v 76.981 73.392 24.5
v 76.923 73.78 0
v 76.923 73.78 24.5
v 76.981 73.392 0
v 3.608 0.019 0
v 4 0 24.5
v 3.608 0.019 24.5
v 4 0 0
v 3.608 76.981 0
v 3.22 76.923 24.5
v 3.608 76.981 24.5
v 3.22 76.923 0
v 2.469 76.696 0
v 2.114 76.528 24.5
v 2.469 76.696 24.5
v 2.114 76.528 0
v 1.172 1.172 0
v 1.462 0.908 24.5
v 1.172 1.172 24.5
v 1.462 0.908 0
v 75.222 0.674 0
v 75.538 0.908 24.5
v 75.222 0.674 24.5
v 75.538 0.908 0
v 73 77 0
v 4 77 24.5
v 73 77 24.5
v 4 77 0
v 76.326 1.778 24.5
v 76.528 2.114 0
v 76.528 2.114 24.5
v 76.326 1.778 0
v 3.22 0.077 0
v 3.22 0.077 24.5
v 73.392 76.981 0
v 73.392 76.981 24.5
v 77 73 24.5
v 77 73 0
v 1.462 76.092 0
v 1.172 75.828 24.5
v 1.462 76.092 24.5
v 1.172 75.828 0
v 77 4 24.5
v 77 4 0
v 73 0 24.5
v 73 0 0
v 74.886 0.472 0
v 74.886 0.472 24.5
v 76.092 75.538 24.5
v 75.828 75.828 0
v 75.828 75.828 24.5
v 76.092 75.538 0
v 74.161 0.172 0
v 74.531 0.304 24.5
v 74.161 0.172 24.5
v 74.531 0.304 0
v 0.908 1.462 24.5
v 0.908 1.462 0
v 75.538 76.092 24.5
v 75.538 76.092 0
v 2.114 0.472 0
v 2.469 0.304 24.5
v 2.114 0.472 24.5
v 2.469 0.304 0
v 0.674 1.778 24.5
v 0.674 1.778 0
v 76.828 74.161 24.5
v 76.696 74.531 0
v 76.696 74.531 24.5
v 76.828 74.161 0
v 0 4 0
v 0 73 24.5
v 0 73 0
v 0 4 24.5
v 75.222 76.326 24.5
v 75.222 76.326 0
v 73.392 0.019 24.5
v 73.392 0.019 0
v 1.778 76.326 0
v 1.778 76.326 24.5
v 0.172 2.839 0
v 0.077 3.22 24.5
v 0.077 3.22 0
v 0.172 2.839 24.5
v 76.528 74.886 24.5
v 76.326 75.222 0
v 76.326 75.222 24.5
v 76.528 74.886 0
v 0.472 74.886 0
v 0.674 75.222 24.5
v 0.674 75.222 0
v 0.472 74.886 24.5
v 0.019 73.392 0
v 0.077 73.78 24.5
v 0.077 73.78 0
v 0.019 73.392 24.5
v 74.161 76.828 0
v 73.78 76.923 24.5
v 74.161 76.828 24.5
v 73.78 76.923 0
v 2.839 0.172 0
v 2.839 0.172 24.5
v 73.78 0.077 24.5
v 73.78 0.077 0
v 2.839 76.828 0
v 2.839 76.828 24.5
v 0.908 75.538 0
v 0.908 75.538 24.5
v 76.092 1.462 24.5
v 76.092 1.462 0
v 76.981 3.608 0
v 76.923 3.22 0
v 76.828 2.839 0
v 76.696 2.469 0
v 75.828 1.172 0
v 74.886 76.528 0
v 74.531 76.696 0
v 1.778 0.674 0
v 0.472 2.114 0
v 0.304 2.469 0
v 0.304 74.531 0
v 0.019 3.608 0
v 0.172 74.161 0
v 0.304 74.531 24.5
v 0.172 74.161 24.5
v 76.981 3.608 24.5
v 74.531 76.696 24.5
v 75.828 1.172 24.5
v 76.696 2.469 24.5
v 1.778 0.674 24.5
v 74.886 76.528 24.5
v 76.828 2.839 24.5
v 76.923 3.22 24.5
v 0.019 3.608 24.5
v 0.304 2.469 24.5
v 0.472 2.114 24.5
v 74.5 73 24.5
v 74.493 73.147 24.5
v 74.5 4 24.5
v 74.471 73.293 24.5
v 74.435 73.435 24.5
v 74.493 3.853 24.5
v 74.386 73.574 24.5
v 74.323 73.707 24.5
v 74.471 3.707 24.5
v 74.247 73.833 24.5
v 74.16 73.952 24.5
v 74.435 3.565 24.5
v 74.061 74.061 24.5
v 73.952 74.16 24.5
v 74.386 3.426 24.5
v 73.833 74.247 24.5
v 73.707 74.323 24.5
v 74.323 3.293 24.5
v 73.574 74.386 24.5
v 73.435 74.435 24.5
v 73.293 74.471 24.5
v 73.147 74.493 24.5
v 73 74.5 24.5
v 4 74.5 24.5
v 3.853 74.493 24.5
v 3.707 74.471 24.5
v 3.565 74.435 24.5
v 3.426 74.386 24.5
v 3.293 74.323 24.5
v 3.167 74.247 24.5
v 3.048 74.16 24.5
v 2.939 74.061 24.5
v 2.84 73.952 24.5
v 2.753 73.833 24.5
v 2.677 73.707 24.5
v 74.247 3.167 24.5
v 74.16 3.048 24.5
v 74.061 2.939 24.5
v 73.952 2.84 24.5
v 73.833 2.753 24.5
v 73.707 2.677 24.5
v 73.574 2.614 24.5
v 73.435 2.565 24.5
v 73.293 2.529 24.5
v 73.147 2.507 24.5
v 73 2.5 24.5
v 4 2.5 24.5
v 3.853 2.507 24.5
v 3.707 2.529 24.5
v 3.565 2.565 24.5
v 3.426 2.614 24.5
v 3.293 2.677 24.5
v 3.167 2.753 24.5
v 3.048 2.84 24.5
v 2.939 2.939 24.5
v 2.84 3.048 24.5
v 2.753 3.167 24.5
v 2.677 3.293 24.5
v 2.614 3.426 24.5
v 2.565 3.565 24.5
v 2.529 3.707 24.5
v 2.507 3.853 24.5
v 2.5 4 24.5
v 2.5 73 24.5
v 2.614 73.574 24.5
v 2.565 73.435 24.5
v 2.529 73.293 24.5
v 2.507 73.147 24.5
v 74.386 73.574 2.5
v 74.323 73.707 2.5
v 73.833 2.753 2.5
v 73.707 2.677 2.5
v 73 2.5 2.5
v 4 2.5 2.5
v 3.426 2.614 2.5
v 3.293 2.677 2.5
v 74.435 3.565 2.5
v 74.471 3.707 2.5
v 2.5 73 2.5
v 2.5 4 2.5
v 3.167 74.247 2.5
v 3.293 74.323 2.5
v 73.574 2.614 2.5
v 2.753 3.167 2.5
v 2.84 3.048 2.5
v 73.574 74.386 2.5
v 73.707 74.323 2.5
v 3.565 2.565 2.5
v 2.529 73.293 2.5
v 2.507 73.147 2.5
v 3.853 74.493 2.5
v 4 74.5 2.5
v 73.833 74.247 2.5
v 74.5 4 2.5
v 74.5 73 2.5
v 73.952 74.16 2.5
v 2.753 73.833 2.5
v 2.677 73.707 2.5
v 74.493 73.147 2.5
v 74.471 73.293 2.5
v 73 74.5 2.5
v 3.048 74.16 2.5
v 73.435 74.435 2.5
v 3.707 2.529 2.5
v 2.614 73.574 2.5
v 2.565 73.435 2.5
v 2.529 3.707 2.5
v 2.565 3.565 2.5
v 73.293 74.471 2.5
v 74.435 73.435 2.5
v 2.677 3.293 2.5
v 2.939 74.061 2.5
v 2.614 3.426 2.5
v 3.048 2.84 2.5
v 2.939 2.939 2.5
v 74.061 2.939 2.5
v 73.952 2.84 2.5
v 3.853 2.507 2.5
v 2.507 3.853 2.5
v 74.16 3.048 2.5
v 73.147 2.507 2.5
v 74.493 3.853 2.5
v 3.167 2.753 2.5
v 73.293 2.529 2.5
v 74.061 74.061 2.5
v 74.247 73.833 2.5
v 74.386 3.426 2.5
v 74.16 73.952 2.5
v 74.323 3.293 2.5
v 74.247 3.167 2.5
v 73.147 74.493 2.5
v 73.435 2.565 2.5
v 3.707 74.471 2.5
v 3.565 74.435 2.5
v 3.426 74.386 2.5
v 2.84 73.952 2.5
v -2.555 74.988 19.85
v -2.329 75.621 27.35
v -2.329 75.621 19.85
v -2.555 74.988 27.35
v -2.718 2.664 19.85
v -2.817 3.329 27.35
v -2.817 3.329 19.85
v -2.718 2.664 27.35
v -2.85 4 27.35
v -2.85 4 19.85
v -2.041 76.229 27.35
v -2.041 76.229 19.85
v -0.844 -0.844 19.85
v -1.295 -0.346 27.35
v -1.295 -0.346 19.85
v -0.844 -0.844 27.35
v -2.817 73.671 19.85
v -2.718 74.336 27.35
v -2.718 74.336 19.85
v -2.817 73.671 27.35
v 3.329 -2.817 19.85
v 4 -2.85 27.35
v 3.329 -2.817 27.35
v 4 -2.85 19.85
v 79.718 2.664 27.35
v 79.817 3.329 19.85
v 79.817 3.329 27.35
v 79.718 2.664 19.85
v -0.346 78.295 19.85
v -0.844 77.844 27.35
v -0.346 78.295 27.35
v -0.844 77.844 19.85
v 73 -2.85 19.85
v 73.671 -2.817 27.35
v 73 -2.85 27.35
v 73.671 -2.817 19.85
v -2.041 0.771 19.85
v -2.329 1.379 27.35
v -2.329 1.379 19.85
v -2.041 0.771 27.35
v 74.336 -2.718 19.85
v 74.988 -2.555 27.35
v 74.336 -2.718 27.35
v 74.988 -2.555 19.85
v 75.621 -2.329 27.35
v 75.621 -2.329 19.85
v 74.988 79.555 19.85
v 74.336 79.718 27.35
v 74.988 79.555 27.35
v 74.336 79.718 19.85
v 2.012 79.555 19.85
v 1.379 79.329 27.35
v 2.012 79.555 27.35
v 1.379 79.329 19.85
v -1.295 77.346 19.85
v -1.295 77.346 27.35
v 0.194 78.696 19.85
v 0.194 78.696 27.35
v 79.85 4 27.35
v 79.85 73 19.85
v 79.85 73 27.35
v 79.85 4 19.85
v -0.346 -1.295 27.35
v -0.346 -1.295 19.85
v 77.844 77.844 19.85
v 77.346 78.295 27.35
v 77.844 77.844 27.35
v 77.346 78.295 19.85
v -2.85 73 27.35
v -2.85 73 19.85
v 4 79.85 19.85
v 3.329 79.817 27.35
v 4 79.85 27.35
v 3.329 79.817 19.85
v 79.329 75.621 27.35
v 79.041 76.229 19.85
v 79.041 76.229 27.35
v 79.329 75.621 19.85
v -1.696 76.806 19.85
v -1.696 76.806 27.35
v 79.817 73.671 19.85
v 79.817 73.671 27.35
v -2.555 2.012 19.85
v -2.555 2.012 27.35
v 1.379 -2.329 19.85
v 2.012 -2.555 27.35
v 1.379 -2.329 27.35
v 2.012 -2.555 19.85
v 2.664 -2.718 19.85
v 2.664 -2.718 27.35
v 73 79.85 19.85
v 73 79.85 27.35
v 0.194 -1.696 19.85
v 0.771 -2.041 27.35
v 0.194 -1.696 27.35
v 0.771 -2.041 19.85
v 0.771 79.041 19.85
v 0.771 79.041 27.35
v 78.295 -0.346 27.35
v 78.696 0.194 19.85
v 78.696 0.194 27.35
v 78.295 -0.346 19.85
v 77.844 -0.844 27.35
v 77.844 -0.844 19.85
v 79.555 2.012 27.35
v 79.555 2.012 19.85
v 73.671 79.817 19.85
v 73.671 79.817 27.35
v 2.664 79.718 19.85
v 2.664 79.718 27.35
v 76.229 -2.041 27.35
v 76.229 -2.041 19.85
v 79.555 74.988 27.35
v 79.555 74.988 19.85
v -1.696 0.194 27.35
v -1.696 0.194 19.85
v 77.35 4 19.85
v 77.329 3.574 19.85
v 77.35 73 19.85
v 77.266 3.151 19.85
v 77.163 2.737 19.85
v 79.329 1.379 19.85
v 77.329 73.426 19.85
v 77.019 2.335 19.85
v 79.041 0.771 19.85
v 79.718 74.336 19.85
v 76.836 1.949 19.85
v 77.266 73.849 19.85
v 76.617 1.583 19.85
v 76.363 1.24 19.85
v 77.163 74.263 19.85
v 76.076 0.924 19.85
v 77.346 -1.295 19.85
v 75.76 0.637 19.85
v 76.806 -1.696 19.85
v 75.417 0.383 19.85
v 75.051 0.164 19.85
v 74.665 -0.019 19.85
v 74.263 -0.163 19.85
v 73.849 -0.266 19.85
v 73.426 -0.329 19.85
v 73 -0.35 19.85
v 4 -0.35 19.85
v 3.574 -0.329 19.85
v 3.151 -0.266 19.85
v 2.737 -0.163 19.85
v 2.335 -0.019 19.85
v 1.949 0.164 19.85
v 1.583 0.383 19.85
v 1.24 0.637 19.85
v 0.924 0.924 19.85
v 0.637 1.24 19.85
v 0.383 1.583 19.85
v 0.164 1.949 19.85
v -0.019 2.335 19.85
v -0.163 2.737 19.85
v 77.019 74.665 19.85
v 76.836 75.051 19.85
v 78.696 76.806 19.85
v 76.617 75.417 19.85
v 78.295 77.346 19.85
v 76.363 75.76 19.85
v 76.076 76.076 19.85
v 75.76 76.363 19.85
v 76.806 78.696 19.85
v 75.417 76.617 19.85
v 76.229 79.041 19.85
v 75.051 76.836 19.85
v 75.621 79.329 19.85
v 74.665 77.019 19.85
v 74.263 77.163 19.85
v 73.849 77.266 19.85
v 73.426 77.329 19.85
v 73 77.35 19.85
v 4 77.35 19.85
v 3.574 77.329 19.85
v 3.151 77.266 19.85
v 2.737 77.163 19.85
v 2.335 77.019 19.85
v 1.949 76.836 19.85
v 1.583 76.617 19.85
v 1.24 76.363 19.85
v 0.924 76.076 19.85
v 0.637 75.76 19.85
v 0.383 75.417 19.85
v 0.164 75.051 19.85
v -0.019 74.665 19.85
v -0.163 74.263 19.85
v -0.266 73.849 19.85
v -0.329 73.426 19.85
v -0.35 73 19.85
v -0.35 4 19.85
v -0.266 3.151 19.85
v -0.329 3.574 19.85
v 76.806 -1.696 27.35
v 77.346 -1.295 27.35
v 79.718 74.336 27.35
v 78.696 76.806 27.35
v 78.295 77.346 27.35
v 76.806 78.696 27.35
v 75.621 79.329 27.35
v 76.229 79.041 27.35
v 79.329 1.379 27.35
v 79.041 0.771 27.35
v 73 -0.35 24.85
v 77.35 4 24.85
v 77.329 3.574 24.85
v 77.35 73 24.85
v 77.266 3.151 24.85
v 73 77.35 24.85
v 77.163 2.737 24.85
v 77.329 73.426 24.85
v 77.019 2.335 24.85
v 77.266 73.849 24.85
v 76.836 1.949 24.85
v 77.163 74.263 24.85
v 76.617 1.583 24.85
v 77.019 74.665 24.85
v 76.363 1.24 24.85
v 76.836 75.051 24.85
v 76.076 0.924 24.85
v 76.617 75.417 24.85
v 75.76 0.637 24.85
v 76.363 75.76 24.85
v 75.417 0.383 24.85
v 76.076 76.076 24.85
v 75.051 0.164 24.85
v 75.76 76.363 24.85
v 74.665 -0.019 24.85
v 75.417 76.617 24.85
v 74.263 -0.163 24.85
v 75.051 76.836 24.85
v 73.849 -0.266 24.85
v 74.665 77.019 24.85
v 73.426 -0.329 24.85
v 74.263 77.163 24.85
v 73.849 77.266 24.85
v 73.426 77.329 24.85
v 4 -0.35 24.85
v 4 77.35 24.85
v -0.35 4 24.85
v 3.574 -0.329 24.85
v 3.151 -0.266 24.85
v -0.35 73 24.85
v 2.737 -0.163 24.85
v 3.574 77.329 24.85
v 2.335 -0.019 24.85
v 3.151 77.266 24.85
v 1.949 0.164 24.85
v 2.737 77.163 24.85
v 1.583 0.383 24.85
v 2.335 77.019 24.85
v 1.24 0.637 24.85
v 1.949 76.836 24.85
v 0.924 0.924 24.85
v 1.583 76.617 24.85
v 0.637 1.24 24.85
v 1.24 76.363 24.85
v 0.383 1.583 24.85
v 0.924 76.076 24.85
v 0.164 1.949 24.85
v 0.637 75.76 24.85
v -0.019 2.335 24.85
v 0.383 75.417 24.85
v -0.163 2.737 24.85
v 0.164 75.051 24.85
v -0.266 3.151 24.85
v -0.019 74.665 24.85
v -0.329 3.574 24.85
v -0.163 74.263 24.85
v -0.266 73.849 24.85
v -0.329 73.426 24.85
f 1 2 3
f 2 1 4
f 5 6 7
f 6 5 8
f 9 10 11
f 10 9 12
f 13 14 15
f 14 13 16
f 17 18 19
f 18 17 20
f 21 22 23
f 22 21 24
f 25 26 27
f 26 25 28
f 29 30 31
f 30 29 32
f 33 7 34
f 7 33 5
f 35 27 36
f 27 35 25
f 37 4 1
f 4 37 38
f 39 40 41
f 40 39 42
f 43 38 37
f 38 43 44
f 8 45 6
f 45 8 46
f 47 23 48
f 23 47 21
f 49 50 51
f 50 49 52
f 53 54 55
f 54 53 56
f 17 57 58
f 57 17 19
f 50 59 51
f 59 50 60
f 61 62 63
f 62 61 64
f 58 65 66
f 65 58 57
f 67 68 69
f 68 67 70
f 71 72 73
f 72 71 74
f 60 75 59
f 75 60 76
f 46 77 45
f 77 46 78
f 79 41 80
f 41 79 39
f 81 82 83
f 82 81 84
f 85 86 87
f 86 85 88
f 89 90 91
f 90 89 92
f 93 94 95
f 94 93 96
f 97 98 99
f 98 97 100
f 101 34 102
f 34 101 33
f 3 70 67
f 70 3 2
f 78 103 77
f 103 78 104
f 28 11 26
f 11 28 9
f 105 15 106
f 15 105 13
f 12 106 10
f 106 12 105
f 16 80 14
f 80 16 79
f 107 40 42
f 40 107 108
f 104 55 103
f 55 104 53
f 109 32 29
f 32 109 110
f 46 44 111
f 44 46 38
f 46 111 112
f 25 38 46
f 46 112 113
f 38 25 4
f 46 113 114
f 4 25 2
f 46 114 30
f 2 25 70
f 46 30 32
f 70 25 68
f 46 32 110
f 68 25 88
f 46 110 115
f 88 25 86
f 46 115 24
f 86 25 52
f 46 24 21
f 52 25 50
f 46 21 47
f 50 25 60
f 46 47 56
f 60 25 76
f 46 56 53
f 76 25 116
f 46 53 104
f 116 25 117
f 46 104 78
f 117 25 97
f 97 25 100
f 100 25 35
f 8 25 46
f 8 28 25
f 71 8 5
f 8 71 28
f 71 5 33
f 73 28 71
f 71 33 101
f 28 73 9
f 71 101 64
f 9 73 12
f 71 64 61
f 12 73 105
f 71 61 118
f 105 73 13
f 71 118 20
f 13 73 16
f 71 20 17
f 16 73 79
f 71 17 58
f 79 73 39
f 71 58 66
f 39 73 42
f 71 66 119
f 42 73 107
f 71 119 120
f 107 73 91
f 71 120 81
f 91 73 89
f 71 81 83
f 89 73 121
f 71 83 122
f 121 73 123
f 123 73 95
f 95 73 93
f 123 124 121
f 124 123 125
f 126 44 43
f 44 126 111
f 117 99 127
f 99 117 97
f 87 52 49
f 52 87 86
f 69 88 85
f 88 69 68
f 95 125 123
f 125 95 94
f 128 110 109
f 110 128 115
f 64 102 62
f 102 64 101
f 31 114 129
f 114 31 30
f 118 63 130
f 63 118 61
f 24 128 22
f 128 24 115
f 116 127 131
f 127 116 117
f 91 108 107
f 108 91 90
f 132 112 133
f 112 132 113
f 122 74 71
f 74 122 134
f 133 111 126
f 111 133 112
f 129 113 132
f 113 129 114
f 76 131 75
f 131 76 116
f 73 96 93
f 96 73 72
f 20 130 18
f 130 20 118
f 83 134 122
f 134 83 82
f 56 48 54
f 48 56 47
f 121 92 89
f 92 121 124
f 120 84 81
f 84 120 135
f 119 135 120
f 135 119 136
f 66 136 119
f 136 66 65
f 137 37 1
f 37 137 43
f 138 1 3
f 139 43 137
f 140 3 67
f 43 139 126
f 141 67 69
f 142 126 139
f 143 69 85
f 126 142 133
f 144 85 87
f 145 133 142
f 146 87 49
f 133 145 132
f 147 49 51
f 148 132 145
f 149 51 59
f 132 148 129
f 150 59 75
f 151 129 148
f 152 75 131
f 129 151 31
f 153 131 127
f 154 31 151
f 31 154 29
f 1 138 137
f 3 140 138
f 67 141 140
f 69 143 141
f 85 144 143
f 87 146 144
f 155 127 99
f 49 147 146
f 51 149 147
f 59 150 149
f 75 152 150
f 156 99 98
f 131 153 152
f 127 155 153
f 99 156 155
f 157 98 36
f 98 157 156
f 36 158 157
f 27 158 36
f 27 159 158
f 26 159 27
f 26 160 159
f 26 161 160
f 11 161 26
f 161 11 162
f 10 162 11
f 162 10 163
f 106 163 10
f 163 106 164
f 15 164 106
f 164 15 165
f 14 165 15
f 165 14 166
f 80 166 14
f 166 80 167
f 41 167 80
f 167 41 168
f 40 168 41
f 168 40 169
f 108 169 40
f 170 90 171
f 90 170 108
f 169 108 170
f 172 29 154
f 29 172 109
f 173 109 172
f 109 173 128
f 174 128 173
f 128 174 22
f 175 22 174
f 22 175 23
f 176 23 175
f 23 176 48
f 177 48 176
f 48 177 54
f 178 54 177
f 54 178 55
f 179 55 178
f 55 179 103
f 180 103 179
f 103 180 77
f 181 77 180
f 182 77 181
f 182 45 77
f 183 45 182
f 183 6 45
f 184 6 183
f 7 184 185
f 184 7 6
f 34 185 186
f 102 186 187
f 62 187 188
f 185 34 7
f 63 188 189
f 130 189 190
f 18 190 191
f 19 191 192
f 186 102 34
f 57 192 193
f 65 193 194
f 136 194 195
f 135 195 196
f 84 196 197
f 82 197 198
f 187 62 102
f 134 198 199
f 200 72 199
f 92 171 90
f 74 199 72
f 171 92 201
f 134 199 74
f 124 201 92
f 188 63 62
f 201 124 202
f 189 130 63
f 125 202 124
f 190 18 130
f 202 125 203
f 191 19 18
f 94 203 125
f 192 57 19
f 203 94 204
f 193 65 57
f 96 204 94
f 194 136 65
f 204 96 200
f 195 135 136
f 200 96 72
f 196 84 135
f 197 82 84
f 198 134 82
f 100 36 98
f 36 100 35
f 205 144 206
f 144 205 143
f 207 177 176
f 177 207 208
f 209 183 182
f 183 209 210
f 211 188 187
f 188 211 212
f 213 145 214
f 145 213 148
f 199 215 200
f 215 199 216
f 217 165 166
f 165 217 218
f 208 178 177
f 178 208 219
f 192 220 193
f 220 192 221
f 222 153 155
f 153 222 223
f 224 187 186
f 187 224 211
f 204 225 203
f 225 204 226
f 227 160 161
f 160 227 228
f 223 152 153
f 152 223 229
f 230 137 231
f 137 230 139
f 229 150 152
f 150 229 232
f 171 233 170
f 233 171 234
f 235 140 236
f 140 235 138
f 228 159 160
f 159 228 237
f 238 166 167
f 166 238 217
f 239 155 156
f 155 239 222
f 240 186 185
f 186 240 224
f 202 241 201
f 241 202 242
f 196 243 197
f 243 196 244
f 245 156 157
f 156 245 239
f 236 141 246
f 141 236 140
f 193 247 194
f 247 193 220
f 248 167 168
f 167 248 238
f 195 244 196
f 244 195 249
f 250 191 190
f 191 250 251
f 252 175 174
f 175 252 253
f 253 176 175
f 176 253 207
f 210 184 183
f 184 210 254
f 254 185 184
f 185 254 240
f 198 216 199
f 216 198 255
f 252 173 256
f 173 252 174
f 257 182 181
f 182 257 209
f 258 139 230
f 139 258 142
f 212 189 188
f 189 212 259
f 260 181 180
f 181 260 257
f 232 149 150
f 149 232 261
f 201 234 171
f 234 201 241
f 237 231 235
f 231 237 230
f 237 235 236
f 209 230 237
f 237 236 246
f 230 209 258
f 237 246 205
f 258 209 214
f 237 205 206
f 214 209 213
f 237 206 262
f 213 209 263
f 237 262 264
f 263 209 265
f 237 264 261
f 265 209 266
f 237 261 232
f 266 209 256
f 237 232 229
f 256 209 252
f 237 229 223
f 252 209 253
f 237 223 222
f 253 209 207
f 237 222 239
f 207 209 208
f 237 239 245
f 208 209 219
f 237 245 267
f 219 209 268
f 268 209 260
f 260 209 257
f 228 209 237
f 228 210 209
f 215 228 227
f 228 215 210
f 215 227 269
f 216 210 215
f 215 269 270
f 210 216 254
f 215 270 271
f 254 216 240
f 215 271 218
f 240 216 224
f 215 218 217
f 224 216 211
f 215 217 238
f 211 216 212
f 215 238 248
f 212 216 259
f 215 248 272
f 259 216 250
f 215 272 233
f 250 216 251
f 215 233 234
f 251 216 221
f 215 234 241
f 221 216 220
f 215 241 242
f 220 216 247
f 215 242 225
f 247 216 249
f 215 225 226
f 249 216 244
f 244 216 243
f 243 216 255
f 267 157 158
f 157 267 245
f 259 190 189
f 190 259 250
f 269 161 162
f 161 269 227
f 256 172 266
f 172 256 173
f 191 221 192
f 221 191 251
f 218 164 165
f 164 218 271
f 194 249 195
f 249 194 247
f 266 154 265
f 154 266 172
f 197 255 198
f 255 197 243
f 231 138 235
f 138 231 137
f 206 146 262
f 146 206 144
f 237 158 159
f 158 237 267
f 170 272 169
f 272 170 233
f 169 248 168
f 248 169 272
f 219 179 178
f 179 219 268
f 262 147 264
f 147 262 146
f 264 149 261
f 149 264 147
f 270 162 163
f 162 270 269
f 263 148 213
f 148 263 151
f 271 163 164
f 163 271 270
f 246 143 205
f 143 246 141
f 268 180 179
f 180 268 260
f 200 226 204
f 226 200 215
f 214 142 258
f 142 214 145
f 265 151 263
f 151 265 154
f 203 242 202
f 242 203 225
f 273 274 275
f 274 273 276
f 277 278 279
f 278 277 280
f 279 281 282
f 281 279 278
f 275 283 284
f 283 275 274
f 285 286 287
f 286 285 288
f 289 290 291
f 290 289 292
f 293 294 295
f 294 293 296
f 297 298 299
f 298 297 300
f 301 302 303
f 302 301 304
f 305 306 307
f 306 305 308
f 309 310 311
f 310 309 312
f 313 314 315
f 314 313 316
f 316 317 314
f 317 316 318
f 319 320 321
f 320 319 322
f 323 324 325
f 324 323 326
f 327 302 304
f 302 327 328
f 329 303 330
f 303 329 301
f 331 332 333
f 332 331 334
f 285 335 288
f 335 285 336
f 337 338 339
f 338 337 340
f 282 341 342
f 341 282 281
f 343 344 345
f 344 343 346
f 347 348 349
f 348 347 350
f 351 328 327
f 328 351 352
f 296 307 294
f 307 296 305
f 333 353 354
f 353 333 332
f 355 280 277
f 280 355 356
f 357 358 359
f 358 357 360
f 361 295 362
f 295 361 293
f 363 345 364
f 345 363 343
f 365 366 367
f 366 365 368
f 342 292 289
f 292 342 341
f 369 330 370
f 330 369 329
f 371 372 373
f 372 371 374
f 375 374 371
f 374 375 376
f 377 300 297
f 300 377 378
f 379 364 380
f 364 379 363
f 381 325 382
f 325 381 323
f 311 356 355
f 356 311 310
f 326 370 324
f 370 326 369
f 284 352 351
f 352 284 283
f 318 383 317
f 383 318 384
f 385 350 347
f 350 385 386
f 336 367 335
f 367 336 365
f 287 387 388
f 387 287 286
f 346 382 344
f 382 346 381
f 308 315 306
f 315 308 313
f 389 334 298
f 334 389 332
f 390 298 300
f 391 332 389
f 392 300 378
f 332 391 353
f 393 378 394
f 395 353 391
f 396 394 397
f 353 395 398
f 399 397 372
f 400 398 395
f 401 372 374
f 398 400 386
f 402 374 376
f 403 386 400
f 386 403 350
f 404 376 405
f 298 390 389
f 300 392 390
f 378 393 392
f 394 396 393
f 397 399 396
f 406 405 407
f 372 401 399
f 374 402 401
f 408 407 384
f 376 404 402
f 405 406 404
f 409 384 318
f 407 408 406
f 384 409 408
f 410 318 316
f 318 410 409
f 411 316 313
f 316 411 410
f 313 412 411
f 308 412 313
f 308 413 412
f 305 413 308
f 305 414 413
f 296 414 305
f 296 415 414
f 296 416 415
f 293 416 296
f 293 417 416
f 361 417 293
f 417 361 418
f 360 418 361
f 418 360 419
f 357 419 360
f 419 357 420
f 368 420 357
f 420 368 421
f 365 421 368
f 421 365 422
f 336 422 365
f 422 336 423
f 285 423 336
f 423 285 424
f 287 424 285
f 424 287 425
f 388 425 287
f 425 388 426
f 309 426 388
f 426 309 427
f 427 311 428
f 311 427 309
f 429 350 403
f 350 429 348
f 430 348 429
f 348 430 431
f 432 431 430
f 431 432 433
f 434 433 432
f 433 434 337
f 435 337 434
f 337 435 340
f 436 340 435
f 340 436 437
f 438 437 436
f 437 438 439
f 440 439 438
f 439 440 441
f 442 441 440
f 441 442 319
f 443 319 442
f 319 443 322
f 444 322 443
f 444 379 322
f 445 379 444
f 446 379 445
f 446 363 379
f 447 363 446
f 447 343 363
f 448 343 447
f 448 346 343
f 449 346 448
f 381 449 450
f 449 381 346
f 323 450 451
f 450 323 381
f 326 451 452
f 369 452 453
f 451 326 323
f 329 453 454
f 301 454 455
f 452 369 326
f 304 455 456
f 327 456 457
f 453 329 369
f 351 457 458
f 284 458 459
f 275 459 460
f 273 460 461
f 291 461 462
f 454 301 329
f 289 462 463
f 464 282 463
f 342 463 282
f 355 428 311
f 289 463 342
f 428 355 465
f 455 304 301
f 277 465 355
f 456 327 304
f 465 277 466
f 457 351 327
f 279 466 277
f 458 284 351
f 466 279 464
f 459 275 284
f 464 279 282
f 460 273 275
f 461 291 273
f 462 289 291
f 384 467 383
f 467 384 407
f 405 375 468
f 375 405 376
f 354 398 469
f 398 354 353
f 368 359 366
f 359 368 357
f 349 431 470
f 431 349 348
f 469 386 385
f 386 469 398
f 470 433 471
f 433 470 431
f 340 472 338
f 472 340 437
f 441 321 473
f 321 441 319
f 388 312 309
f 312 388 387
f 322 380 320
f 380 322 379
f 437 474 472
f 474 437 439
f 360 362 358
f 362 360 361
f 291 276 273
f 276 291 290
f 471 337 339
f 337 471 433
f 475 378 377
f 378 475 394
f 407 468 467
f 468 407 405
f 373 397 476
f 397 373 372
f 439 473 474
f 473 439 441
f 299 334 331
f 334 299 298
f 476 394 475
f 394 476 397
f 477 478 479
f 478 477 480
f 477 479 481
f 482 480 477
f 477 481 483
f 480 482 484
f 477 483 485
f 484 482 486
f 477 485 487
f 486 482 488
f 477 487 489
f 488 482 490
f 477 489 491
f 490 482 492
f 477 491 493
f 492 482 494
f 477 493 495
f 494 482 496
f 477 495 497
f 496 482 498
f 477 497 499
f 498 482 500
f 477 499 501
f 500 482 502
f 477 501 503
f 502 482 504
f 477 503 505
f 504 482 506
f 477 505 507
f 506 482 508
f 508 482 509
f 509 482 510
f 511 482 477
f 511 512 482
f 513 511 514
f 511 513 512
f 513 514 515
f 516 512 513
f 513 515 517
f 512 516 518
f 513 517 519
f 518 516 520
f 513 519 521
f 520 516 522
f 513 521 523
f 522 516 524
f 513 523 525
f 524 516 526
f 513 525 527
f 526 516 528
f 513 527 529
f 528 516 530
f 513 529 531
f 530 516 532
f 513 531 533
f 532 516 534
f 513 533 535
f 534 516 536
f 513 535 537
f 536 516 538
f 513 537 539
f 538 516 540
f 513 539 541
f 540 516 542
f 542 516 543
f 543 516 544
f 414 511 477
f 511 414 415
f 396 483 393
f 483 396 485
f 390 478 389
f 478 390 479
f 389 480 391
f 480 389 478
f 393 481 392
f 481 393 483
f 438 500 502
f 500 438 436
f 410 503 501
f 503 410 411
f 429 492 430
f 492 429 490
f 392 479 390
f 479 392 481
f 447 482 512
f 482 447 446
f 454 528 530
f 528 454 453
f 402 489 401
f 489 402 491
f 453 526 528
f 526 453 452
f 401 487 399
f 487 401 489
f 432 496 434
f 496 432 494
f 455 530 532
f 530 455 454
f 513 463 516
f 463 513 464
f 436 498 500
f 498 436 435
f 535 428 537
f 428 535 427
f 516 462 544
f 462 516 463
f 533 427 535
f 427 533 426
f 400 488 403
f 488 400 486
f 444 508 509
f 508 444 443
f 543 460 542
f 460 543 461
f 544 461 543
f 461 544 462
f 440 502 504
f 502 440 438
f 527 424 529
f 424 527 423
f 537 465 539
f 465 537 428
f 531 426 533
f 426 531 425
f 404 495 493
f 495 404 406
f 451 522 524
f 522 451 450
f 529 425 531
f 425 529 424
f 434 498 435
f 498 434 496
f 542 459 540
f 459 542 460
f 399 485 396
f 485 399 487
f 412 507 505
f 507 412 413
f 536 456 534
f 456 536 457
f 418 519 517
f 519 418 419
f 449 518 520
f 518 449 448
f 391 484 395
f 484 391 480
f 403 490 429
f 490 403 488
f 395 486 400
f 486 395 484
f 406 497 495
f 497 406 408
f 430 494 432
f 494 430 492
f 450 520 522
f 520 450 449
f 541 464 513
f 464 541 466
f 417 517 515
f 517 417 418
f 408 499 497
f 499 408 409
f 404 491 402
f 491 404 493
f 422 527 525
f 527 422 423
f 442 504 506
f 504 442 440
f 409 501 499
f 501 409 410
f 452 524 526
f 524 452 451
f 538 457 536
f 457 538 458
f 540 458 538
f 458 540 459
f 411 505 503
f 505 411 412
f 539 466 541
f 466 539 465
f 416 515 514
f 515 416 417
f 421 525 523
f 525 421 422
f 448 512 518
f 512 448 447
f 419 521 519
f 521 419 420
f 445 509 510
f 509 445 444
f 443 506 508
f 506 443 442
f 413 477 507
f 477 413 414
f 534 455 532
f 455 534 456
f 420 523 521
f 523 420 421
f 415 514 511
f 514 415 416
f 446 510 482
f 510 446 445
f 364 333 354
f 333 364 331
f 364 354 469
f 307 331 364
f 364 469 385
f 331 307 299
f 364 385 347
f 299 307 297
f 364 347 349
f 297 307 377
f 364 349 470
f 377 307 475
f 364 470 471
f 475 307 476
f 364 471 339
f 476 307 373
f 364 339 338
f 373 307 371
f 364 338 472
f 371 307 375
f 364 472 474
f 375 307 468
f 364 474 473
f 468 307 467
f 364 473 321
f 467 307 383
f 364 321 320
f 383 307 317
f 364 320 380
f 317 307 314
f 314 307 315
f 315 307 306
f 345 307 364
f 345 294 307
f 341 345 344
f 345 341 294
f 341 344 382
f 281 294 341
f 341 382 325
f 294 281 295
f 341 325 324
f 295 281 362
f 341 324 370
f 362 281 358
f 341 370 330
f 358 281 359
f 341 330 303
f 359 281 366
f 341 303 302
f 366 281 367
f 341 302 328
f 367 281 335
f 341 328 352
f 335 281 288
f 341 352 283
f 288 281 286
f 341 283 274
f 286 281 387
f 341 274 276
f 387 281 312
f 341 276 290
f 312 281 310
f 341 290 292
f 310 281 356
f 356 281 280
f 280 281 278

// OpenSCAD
$fn = 64;

// Units: mm

clearance = 0.35;
wall = 2.5;
eps = 0.02;

cavity_x = 72;
cavity_y = 72;
cavity_z = 22;

base_corner_r = 4;
cavity_corner_r = base_corner_r - wall;

base_outer_x = cavity_x + 2 * wall;
base_outer_y = cavity_y + 2 * wall;
base_height = cavity_z + wall;

lid_skirt_height = 5;
lid_top_thickness = wall;

lid_inner_x = base_outer_x + 2 * clearance;
lid_inner_y = base_outer_y + 2 * clearance;
lid_inner_r = base_corner_r + clearance;

lid_outer_x = lid_inner_x + 2 * wall;
lid_outer_y = lid_inner_y + 2 * wall;
lid_outer_r = lid_inner_r + wall;

module rounded_box(size, r) {
    hull() {
        translate([r, r, 0])
            cylinder(h = size[2], r = r);
        translate([size[0] - r, r, 0])
            cylinder(h = size[2], r = r);
        translate([r, size[1] - r, 0])
            cylinder(h = size[2], r = r);
        translate([size[0] - r, size[1] - r, 0])
            cylinder(h = size[2], r = r);
    }
}

module base() {
    difference() {
        rounded_box([base_outer_x, base_outer_y, base_height], base_corner_r);

        translate([wall, wall, wall])
            rounded_box([cavity_x, cavity_y, cavity_z + eps], cavity_corner_r);
    }
}

module lid() {
    translate([
        -(wall + clearance),
        -(wall + clearance),
        base_height + clearance - lid_skirt_height
    ])
    union() {
        difference() {
            rounded_box([lid_outer_x, lid_outer_y, lid_skirt_height], lid_outer_r);

            translate([wall, wall, -eps])
                rounded_box(
                    [lid_inner_x, lid_inner_y, lid_skirt_height + 2 * eps],
                    lid_inner_r
                );
        }

        translate([0, 0, lid_skirt_height])
            rounded_box([lid_outer_x, lid_outer_y, lid_top_thickness], lid_outer_r);
    }
}

color("lightsteelblue") base();
color("gainsboro") lid();
